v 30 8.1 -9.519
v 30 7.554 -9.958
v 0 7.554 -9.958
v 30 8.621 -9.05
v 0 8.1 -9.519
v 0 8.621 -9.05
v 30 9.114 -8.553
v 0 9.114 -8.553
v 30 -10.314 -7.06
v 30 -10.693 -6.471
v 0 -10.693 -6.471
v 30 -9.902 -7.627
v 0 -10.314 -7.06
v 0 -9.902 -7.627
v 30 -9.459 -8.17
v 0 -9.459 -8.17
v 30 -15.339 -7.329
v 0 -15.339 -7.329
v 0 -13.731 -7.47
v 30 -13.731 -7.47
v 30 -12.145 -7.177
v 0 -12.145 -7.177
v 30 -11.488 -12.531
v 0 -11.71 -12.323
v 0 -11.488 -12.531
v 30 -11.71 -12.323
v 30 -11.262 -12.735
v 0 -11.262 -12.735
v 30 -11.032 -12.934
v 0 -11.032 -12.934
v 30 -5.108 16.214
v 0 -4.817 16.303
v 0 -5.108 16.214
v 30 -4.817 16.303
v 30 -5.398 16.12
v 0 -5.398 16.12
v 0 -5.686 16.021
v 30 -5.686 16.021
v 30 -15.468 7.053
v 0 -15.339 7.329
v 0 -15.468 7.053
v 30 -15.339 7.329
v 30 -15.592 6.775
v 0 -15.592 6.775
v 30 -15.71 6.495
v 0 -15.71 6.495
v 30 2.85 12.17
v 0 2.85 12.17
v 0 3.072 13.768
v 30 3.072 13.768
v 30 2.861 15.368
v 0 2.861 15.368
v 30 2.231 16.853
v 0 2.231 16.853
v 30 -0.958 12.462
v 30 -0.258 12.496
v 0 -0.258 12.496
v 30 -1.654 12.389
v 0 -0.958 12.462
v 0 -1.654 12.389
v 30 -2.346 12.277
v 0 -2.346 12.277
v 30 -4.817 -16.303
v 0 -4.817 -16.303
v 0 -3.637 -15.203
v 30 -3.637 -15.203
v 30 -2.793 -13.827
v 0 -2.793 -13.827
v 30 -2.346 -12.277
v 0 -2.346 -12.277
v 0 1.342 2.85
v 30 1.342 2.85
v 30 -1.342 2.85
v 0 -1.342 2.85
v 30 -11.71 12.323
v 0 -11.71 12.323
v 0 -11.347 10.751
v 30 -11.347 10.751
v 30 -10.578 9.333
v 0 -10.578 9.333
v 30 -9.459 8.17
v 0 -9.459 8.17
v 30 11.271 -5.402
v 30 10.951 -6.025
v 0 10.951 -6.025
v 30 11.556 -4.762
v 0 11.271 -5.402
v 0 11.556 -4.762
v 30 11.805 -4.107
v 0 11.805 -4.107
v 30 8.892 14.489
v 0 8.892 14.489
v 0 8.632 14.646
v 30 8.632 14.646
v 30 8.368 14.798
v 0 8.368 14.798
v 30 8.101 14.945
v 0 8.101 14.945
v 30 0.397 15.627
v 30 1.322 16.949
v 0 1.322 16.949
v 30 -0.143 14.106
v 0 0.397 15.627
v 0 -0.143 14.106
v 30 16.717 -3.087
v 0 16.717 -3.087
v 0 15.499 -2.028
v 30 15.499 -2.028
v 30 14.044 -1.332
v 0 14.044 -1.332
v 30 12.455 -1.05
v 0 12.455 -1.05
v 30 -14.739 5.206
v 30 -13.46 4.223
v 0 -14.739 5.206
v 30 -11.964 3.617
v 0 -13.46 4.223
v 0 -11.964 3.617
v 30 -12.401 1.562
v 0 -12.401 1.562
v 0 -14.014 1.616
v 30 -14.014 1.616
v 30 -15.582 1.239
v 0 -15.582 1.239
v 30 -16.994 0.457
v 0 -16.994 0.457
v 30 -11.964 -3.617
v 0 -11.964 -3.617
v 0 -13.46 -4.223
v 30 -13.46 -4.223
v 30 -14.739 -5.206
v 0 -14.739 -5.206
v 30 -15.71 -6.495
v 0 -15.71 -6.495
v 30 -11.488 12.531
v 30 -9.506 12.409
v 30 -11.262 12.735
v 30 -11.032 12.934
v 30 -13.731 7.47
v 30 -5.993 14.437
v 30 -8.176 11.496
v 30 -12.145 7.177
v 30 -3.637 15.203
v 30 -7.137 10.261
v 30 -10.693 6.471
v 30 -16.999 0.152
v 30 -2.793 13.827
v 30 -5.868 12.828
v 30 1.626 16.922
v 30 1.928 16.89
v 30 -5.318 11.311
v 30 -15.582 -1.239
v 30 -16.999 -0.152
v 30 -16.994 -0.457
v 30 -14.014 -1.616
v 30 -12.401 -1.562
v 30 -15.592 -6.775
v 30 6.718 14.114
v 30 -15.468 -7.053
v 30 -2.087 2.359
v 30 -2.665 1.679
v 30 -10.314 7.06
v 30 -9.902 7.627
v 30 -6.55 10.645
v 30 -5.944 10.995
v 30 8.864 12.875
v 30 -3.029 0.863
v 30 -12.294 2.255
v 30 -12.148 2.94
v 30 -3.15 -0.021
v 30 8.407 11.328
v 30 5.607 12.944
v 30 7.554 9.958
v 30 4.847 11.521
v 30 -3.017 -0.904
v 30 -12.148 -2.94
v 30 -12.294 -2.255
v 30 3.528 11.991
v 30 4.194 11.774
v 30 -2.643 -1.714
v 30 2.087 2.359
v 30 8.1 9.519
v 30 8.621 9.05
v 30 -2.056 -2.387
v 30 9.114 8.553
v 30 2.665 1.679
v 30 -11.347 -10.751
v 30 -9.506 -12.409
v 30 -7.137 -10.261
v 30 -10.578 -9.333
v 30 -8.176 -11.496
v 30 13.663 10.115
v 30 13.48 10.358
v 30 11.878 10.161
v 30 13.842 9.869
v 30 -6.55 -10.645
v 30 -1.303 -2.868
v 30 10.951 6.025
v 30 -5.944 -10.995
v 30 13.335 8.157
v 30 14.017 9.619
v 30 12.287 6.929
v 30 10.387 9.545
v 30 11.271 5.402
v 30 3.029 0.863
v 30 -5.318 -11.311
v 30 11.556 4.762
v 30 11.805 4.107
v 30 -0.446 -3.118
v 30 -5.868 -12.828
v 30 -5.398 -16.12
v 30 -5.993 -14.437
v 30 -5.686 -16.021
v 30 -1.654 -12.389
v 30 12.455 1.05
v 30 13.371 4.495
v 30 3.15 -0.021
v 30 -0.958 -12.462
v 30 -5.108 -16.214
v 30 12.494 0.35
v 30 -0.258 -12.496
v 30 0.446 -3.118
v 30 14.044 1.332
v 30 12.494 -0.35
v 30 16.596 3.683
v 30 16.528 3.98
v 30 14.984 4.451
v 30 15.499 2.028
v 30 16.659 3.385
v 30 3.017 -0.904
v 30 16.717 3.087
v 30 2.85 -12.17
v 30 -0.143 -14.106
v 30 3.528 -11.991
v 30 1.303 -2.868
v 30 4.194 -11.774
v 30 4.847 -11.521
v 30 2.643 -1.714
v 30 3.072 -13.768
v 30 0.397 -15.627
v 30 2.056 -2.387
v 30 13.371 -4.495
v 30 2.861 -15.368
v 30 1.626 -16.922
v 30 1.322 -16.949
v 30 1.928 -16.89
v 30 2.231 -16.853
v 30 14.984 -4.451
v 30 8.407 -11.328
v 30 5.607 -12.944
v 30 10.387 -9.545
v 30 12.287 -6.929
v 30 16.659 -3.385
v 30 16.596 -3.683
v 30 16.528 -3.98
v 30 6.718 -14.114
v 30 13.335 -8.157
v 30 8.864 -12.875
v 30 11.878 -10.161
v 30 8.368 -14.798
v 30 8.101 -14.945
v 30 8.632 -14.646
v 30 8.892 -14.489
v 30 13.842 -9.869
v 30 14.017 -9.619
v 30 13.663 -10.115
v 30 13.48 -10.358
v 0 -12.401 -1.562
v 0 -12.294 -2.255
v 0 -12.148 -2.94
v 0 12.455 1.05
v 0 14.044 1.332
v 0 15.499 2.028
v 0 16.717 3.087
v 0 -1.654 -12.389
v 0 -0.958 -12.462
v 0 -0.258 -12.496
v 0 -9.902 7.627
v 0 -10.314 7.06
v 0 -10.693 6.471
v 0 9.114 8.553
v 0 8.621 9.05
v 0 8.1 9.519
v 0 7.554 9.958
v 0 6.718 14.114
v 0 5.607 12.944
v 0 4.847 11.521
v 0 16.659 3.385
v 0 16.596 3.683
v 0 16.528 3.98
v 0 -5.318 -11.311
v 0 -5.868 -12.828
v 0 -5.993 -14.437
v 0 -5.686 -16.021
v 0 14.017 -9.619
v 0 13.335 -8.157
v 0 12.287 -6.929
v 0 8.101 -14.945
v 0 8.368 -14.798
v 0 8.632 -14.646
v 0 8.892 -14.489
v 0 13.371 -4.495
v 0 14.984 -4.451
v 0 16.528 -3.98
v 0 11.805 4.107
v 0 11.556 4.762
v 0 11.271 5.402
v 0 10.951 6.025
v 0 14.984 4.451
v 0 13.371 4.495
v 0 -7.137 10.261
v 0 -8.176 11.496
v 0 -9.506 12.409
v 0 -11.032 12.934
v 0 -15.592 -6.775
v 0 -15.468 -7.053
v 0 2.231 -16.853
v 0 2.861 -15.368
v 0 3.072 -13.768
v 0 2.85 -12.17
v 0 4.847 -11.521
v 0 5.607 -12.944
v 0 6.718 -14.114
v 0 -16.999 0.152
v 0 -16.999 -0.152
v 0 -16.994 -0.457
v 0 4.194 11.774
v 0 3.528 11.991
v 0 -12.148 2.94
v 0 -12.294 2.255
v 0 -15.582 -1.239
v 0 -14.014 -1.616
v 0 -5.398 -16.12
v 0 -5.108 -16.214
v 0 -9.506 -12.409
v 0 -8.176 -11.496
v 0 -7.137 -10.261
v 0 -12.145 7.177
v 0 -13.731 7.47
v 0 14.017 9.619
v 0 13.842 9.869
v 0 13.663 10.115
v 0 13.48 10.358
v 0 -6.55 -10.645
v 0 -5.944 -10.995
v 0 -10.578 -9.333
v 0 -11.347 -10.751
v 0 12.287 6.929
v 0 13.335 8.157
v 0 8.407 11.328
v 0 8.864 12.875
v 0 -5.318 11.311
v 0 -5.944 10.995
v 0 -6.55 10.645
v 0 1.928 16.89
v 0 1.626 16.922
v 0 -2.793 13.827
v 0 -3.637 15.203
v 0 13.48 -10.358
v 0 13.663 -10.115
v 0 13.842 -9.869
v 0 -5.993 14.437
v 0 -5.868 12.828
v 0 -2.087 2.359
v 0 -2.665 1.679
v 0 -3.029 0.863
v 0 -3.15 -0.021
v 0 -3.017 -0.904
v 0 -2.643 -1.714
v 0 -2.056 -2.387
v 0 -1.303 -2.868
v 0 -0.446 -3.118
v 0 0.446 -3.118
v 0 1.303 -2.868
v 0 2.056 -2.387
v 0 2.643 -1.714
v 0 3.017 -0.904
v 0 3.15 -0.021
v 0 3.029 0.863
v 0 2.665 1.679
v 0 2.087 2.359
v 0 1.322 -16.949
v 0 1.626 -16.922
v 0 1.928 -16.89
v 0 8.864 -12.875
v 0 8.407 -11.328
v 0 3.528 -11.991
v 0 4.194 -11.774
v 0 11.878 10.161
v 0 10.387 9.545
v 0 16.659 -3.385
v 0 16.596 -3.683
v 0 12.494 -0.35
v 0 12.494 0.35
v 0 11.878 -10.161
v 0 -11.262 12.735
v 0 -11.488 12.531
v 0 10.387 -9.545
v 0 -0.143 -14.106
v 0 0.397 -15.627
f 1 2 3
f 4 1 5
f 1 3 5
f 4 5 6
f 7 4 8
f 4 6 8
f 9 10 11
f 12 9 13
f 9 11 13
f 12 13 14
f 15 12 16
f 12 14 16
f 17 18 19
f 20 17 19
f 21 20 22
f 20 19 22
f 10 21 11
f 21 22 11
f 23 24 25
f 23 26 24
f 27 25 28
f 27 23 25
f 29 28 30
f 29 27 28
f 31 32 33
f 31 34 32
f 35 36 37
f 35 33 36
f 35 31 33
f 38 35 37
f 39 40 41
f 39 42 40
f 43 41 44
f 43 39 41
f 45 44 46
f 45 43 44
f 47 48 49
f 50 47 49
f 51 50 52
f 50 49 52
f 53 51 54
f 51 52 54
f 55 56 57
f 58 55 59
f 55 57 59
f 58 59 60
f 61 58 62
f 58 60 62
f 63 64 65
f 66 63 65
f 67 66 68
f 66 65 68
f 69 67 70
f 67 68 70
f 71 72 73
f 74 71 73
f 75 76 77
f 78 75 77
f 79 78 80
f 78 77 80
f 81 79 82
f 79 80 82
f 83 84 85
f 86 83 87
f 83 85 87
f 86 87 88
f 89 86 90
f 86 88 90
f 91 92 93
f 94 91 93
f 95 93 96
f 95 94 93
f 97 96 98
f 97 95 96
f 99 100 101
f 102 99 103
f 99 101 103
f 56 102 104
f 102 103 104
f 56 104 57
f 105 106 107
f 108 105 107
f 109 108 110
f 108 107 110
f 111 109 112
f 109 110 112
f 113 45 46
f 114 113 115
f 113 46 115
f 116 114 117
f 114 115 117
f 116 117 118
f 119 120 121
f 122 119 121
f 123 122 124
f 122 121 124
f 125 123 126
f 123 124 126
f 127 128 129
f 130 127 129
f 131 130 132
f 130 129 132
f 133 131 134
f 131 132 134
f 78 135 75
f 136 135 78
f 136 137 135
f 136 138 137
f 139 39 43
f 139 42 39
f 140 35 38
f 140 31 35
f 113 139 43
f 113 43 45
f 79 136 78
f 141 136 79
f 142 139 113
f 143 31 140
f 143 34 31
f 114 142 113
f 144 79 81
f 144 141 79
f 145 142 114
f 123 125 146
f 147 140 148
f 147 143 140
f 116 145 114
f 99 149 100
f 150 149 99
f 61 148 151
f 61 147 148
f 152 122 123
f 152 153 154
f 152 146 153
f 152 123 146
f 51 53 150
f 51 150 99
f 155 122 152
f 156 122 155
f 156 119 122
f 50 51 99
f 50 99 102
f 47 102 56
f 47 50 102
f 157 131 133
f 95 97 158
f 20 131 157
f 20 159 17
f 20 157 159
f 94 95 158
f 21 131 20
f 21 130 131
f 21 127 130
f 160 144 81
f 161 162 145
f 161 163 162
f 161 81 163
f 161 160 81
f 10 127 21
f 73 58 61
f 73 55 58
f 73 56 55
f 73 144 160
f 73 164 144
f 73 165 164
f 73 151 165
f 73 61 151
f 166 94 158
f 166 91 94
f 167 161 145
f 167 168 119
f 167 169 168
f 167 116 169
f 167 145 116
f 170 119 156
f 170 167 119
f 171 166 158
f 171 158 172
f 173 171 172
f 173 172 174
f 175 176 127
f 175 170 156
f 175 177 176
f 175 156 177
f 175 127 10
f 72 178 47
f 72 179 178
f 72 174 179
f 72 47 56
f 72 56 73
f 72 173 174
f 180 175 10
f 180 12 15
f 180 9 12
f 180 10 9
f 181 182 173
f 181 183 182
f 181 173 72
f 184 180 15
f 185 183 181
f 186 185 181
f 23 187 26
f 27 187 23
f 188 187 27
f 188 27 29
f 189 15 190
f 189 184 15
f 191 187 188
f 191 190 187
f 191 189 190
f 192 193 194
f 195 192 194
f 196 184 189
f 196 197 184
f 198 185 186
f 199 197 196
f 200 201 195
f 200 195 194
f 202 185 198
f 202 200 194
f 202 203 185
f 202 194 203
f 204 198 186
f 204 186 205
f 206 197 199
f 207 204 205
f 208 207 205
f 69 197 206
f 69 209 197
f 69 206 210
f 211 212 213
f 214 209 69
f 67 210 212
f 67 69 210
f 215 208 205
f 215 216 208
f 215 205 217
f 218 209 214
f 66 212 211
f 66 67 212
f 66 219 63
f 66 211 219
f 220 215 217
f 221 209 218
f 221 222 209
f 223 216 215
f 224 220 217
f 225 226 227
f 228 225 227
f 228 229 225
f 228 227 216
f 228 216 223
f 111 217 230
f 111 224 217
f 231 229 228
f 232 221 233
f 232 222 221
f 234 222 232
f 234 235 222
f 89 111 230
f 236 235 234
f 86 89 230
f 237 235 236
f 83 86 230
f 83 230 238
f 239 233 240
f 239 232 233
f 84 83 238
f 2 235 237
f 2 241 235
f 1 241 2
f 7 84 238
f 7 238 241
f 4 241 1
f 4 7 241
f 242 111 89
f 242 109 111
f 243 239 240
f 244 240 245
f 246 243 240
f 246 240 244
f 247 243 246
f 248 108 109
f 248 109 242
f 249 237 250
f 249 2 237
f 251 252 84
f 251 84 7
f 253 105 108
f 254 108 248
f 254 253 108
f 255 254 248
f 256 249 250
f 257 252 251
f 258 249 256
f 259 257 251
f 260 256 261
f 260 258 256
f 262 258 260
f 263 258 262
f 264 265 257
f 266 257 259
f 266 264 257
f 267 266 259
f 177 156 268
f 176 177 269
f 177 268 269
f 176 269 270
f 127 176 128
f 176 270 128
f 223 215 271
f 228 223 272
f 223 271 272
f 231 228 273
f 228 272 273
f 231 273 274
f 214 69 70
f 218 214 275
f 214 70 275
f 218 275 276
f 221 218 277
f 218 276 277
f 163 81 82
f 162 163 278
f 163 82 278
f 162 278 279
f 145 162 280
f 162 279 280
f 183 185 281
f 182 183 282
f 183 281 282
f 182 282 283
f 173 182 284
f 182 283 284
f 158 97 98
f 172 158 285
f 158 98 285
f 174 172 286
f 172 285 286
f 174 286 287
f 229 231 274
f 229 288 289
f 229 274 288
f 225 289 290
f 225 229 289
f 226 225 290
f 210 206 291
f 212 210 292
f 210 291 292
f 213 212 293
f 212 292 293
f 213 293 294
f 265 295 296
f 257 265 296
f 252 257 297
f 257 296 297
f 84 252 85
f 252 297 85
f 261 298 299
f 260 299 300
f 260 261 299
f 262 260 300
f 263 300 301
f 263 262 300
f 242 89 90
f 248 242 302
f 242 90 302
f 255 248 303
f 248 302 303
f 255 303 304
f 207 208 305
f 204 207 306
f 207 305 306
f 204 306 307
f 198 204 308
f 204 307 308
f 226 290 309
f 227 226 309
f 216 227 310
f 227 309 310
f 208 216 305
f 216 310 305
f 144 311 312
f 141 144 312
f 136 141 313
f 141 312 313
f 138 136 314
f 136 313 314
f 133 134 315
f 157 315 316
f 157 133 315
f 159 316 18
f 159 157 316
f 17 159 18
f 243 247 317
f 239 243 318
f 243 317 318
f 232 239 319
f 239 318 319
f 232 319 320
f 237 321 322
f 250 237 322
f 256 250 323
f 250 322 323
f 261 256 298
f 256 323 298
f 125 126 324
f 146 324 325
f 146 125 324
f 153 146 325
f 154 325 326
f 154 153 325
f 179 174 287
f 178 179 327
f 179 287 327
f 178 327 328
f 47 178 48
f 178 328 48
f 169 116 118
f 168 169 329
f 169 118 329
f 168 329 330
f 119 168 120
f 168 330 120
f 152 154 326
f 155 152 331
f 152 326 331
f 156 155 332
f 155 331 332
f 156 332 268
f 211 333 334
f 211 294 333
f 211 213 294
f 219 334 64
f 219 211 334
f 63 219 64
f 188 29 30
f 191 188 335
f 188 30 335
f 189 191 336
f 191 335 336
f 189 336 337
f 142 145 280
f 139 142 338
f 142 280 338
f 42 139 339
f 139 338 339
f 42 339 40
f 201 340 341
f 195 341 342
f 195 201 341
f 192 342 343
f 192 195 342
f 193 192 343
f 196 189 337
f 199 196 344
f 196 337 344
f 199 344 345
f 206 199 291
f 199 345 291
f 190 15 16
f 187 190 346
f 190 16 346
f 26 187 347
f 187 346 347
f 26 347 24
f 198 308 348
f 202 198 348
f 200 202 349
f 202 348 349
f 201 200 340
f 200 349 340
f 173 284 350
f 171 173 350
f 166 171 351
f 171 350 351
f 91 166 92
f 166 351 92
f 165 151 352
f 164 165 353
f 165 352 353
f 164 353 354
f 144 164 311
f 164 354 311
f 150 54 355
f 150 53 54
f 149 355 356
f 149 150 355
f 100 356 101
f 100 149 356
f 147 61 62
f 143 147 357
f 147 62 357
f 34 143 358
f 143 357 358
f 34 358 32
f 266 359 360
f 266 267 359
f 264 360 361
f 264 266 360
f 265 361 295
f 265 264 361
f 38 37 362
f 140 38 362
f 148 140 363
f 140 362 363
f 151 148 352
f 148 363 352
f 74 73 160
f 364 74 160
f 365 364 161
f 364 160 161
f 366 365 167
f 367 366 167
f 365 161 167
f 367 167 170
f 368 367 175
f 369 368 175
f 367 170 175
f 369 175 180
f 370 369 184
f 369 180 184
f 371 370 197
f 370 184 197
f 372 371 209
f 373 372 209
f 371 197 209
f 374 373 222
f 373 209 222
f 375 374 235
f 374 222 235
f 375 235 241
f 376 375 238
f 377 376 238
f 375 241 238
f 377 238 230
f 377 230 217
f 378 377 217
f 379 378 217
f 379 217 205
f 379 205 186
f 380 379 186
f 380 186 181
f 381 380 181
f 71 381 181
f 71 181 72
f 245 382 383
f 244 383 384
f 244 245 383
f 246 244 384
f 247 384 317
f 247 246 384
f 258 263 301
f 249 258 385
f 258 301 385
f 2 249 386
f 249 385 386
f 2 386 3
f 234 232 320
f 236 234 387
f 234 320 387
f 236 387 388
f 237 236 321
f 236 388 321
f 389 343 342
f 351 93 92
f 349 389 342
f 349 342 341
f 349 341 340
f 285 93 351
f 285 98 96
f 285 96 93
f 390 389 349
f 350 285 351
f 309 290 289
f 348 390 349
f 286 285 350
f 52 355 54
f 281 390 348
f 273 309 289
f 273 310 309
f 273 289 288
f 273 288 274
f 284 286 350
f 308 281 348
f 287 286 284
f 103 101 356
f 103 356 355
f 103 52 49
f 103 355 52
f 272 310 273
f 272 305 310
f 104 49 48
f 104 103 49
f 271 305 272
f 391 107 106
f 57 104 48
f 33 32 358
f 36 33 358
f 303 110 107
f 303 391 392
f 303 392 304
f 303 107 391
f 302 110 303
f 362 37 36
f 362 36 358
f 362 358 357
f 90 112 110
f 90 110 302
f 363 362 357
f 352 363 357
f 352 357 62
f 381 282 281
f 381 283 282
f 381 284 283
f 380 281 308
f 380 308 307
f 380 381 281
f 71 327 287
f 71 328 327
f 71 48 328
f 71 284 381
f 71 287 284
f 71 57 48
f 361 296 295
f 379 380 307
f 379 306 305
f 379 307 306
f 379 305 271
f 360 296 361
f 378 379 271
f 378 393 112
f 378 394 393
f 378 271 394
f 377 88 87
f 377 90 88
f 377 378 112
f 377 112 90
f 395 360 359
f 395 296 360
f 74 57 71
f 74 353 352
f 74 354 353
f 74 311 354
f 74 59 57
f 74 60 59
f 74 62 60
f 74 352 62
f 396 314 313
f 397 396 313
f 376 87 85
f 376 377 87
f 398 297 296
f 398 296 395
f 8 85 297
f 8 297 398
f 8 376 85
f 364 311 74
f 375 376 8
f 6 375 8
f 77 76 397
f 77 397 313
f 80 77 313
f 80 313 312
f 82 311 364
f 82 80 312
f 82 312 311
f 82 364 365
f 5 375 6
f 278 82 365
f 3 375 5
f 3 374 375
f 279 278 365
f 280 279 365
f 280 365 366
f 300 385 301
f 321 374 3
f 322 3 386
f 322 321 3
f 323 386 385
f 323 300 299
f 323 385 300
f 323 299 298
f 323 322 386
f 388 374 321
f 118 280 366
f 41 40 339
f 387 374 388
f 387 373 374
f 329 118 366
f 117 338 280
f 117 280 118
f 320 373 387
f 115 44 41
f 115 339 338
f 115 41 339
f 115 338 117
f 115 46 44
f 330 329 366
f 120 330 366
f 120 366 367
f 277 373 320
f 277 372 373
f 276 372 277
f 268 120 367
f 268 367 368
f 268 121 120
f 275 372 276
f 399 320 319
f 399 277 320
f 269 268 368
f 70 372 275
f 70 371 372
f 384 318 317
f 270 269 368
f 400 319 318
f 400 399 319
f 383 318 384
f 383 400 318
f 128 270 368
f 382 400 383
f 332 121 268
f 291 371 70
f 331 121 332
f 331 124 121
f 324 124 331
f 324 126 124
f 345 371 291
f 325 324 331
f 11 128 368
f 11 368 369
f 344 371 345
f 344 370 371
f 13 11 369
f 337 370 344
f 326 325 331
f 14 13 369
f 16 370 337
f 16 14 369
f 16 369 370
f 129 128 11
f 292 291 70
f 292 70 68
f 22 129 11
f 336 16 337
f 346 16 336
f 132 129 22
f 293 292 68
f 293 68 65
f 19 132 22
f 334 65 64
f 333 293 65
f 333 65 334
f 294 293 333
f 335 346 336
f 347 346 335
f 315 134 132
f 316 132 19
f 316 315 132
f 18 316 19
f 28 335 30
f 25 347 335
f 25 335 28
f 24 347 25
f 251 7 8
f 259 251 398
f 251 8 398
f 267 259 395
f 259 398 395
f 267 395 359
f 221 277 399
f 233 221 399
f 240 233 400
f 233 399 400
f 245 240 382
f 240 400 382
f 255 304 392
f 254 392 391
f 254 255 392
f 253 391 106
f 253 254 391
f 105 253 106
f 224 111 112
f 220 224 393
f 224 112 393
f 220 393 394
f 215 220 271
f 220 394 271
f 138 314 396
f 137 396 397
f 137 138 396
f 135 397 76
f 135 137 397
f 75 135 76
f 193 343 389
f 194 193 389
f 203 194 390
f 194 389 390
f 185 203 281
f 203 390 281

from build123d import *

# Parameters (mm, degrees)
BASPROSKE_W              = 30
BASPROSKE_H              = 17
TOOTHCUT_DEPTH           = 39.444765573
TEETHCUTS_COUNT          = 15
TEETHCUTS_ANGLE          = 336
BORSKE_R                 = 5
BORE_DEPTH               = 50.0000508
ESBO_O1_R                = 5
RESSALTO_EXTRUS_O1_DEPTH = 30
CORTE_EXTRUS_O1_REACH    = 40.422


with BuildPart() as part:
    # BasProSke → Base-Revolve (revolve)
    with BuildSketch(Plane(origin=(0, 0, 0), x_dir=(1, 0, 0), z_dir=(0, 1, 0)), mode=Mode.PRIVATE) as base_revolve_sk:
        with Locations((15, 8.5)):
            Rectangle(BASPROSKE_W, BASPROSKE_H)
    revolve(base_revolve_sk.sketch.rotate(Axis((-10, 0, 0), (1, 0, 0)), 180), axis=Axis((-10, 0, 0), (1, 0, 0)))

    # TooCutSke → ToothCut (cut, through all)
    with BuildSketch(Plane(origin=(0, 0, 0), x_dir=(0, 0, -1), z_dir=(1, 0, 0))):
        with BuildLine():
            ThreePointArc((1.050056448, 12.454813626), (0, 12.499), (-1.050056448, 12.454813626))
            ThreePointArc((-1.050056448, 12.454813626), (-1.638118106, 14.809604533), (-3.110934279, 16.73876737))
            ThreePointArc((-3.110934279, 16.73876737), (0, 17.0254), (3.110934279, 16.73876737))
            ThreePointArc((3.110934279, 16.73876737), (1.638118106, 14.809604533), (1.050056448, 12.454813626))
        make_face()
    toothcut = extrude(amount=TOOTHCUT_DEPTH, mode=Mode.SUBTRACT)

    # TeethCuts: ToothCut ×15 about axis
    teethcuts_axis = Axis((-10, 0, 0), (1, 0, 0))
    for i in range(1, TEETHCUTS_COUNT):
        add(toothcut.rotate(teethcuts_axis, i * TEETHCUTS_ANGLE / (TEETHCUTS_COUNT - 1)), mode=Mode.SUBTRACT)

    # BorSke → Bore (cut, symmetric)
    with BuildSketch(Plane(origin=(0, 0, 0), x_dir=(0, 0, -1), z_dir=(1, 0, 0))):
        with Locations(Location((0, 0, 0), (0, 0, 180))):
            Circle(BORSKE_R)
    extrude(amount=BORE_DEPTH, both=True, mode=Mode.SUBTRACT)

    # Esboço1 → Ressalto-extrusão1 (add)
    with BuildSketch(Plane(origin=(30, 0, 0), x_dir=(0, 0, -1), z_dir=(1, 0, 0))):
        Circle(ESBO_O1_R)
    extrude(amount=-RESSALTO_EXTRUS_O1_DEPTH)

    # Esboço2 → Corte-extrusão1 (cut, up to next)
    with BuildSketch(Plane(origin=(30, 0, 0), x_dir=(0, 0, -1), z_dir=(1, 0, 0)), mode=Mode.PRIVATE) as corte_extrus_o1_sk1:
        with BuildLine():
            Line((-2.85, 1.341640786), (-2.85, -1.341640786))
            ThreePointArc((-2.85, -1.341640786), (3.15, 0), (-2.85, 1.341640786))
        make_face()
    corte_extrus_o1_tool1 = extrude(corte_extrus_o1_sk1.sketch, amount=-CORTE_EXTRUS_O1_REACH, mode=Mode.PRIVATE) & part.part
    add(corte_extrus_o1_tool1.solids().sort_by_distance((30, 0, -0.052561))[0], mode=Mode.SUBTRACT)


solid = part.part
